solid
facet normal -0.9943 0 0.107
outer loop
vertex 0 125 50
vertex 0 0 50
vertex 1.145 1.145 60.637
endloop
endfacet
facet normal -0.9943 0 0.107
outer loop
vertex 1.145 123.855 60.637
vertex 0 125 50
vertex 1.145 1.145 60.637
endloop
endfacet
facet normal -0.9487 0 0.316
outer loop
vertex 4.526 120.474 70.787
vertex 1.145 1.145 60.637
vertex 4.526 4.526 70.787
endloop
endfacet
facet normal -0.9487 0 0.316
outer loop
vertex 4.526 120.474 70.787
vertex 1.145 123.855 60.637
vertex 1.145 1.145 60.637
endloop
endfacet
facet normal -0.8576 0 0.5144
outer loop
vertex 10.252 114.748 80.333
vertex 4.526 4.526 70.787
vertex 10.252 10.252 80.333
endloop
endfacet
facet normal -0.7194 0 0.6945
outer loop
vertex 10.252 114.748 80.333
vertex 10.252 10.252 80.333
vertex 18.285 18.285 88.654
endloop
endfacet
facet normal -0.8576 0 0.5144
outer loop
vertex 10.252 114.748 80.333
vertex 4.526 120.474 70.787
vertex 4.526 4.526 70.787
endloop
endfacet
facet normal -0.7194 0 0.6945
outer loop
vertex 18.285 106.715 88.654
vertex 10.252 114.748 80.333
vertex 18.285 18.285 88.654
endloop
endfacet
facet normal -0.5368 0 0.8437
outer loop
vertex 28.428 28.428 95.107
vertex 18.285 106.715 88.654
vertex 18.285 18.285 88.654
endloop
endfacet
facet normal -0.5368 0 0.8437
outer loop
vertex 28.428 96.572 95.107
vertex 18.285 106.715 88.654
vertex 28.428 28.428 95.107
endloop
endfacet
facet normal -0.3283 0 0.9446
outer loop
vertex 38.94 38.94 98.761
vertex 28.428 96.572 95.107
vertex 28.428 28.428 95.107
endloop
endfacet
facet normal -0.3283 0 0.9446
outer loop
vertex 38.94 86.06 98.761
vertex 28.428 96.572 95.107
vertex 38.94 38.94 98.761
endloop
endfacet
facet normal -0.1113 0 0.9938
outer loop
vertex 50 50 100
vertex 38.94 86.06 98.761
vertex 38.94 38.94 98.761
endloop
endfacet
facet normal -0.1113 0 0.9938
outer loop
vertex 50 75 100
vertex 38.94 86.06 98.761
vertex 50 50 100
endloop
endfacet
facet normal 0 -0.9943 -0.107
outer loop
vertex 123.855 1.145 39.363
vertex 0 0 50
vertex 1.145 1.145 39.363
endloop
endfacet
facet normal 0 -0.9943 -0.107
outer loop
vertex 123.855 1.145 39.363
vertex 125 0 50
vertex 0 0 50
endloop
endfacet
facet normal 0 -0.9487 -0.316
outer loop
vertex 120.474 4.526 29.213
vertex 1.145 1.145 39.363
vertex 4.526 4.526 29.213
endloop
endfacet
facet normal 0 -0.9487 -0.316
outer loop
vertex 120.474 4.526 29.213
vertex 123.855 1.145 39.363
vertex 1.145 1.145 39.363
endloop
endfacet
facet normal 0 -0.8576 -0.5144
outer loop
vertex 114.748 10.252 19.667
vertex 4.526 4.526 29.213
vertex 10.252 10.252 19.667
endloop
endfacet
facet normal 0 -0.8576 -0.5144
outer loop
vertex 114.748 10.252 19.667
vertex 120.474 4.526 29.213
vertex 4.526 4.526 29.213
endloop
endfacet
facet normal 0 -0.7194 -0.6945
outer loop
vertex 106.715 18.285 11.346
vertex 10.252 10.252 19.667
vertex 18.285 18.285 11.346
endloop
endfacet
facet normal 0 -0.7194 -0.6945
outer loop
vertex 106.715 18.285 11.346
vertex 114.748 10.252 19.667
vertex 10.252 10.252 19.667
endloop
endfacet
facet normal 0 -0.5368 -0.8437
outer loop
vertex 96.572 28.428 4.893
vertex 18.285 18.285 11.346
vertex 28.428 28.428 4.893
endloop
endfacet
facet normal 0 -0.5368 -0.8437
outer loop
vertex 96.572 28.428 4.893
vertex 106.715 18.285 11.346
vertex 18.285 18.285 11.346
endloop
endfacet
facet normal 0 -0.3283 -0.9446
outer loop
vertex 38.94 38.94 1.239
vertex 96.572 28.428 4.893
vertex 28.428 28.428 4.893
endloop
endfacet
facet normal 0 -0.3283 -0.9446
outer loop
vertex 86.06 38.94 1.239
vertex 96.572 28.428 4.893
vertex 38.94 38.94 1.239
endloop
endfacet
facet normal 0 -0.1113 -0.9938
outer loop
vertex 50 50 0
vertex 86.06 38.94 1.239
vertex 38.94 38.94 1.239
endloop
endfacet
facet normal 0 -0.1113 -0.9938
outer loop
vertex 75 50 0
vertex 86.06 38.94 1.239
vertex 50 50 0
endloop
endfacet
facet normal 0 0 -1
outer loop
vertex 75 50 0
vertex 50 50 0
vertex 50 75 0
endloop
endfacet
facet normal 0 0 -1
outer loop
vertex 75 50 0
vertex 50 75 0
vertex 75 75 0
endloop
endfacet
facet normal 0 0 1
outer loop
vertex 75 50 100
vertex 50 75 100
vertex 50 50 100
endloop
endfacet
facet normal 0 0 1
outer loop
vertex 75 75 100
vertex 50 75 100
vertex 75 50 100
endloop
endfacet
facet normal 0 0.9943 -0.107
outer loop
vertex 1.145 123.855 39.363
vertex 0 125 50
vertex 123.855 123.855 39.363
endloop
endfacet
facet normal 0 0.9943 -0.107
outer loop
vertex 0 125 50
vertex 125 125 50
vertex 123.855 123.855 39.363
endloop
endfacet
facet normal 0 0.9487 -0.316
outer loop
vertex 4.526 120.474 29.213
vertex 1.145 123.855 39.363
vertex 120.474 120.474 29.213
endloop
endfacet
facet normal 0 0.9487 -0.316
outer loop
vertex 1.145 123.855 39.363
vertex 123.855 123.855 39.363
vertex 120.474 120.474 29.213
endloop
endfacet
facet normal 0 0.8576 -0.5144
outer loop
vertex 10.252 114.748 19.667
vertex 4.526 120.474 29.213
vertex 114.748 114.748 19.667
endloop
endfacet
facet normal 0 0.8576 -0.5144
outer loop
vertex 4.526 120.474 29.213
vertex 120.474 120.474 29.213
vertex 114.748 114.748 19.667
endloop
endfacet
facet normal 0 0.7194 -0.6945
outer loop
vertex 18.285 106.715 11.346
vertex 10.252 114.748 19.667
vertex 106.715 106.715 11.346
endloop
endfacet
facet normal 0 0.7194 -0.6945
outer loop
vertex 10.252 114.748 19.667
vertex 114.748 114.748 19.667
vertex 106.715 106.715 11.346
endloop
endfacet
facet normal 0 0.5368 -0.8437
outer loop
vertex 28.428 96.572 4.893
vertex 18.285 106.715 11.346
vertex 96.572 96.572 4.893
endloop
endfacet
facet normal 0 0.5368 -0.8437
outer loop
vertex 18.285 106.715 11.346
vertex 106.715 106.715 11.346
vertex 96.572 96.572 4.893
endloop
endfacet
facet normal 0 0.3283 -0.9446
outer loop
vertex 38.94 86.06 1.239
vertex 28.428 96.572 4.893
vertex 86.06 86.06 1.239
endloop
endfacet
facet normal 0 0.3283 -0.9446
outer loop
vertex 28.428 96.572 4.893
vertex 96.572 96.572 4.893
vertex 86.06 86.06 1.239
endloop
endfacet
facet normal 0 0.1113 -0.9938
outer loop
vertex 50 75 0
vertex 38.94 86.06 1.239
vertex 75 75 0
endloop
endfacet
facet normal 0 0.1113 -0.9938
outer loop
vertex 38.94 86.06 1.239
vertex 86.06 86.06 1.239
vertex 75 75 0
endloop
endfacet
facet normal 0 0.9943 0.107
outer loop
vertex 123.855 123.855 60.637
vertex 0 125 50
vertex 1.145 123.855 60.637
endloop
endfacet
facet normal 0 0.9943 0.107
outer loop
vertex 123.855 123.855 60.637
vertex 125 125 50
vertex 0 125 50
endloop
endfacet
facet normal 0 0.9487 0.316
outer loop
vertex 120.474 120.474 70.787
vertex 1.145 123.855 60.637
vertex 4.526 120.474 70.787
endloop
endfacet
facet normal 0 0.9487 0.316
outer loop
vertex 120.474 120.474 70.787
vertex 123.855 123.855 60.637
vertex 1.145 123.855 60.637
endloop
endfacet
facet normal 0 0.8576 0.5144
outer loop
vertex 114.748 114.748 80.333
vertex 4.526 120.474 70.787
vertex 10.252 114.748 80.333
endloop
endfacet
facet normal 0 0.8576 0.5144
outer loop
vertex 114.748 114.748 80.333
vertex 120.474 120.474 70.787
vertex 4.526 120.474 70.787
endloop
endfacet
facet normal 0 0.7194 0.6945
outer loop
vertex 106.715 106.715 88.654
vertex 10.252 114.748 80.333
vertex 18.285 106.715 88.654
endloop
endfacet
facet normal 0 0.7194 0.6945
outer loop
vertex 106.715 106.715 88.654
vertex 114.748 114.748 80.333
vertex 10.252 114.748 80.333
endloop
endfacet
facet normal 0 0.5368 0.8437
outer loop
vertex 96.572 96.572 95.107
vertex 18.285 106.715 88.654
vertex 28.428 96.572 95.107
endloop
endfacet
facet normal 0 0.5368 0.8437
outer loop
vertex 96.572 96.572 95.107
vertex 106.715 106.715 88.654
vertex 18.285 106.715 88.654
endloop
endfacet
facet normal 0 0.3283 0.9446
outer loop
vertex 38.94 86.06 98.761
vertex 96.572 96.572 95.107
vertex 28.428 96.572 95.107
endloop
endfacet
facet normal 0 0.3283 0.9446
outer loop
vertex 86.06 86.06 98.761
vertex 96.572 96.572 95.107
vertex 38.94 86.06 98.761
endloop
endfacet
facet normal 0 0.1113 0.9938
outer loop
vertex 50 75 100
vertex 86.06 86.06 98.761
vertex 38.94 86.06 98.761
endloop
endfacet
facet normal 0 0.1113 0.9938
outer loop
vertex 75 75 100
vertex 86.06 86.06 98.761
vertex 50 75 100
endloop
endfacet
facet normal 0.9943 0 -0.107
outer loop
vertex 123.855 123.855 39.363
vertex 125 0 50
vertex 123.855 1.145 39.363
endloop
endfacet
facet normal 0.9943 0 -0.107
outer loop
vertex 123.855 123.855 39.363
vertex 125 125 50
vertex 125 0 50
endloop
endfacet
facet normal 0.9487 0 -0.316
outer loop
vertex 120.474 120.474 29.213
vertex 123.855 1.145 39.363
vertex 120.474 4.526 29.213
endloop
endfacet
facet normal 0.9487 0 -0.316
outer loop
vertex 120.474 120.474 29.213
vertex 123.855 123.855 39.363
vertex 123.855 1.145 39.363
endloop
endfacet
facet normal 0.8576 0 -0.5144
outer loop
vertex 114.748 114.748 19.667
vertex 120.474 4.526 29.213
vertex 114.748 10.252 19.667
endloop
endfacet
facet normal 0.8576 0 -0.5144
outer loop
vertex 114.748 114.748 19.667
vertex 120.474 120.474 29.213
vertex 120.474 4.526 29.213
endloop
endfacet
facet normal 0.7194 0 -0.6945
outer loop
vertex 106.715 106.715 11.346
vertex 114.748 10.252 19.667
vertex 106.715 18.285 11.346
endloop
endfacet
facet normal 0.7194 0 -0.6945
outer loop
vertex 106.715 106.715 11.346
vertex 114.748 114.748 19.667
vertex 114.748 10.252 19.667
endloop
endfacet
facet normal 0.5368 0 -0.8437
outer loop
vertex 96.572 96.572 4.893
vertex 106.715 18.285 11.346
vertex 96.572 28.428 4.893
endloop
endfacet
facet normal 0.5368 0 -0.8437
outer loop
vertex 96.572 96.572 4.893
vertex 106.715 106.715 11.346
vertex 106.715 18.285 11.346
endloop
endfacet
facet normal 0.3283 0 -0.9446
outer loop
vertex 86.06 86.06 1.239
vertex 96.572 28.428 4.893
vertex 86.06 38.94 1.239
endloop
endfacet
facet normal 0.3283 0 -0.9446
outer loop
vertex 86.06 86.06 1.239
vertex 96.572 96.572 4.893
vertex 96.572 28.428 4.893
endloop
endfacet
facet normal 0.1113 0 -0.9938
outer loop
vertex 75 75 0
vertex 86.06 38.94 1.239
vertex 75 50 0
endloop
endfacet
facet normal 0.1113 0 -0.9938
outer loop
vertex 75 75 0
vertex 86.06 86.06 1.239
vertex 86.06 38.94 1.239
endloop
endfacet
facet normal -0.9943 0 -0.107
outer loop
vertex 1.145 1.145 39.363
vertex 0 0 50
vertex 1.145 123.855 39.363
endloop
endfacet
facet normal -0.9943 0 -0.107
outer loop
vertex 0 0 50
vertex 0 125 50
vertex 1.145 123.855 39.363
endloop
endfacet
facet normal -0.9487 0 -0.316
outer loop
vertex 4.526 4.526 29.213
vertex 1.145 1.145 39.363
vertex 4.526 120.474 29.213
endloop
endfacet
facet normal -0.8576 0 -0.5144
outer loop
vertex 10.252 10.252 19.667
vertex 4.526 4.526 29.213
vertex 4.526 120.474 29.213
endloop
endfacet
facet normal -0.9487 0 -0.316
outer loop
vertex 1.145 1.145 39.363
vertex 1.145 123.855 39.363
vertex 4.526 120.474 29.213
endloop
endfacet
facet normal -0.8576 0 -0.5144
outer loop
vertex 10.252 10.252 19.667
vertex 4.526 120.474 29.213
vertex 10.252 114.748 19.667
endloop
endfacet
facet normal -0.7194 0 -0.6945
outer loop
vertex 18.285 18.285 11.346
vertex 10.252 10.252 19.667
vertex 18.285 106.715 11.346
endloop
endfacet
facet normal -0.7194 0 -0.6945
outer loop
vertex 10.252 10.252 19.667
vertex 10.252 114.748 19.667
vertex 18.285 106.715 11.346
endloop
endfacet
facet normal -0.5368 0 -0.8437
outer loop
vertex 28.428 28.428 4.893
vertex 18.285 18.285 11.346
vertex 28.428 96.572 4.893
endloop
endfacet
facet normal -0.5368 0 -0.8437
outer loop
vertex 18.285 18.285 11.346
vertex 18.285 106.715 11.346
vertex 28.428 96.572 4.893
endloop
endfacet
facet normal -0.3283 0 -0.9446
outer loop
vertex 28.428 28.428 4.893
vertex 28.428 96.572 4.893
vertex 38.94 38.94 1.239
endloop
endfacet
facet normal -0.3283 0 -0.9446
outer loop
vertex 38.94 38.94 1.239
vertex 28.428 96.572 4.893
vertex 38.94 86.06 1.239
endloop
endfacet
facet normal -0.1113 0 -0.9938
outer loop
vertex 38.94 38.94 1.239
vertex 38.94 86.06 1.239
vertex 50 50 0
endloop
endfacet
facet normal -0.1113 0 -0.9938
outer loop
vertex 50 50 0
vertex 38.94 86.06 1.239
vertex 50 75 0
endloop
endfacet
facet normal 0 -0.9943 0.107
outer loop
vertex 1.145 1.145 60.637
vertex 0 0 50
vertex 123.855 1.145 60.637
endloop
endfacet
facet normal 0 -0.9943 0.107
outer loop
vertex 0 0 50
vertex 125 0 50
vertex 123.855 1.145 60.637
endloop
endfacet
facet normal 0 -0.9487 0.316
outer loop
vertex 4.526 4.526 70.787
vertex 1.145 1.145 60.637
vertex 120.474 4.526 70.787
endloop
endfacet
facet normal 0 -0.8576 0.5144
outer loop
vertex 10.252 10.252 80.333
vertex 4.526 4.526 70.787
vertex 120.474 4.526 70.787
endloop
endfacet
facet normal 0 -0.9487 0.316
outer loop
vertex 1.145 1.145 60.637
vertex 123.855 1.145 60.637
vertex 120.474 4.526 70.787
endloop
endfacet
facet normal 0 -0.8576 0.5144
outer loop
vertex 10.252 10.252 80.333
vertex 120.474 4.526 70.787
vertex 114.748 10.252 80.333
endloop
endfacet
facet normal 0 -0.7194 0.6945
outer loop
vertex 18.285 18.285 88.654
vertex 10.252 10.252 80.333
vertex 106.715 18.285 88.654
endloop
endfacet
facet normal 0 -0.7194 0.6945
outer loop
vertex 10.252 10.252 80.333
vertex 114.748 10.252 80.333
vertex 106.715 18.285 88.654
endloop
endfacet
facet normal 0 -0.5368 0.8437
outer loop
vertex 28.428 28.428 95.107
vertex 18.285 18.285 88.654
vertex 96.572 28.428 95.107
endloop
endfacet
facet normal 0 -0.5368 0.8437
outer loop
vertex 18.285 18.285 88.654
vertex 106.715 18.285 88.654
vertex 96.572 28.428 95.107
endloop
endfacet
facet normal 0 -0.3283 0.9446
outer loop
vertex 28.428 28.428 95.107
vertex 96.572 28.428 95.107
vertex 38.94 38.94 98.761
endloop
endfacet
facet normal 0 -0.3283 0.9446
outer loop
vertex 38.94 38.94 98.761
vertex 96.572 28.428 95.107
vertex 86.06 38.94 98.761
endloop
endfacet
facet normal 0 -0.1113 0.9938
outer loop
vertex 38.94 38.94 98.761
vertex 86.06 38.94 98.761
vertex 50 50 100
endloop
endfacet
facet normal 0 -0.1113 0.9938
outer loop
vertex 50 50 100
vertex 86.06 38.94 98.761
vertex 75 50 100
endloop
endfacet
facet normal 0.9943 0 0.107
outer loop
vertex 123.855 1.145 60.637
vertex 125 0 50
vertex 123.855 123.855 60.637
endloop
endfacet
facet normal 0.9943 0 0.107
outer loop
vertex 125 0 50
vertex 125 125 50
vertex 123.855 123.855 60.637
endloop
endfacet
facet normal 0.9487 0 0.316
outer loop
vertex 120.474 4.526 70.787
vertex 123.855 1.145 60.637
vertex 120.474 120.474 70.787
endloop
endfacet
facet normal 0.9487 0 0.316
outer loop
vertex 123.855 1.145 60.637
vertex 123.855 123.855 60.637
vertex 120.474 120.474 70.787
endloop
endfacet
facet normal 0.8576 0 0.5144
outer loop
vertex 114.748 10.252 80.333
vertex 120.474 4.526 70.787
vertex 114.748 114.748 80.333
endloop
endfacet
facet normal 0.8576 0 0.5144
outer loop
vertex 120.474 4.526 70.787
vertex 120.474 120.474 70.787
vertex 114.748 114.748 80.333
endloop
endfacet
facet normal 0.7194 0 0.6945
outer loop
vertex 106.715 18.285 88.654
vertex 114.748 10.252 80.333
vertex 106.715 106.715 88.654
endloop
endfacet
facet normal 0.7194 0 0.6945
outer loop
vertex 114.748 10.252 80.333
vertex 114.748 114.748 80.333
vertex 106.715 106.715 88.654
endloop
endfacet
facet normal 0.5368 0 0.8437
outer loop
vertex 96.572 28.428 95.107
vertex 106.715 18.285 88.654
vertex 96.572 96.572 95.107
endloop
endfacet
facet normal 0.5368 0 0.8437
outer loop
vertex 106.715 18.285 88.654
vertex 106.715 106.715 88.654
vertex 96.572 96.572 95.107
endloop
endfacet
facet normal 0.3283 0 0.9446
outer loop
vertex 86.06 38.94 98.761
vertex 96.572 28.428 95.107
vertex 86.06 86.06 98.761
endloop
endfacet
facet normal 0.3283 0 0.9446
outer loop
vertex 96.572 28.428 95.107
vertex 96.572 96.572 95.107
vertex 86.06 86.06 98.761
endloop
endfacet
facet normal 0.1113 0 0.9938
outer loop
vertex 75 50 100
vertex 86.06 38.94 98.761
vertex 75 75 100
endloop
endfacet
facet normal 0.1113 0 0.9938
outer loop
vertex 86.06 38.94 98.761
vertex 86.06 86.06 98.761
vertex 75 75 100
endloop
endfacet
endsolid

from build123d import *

# Parameters (mm, degrees)
SKETCH1_W           = 125
SKETCH1_H           = 125
BOSS_EXTRUDE1_DEPTH = 100
FILLET1_R           = 50


with BuildPart() as part:
    # Sketch1 → Boss-Extrude1 (new body)
    with BuildSketch(Plane.XY):
        with Locations((62.5, 62.5)):
            Rectangle(SKETCH1_W, SKETCH1_H)
    extrude(amount=BOSS_EXTRUDE1_DEPTH)

    # Fillet1
    fillet1_edges = [part.edges().sort_by_distance(p)[0] for p in [
        (62.5, 0, 0),
        (125, 62.5, 0),
        (62.5, 125, 0),
        (0, 62.5, 0),
        (62.5, 125, 100),
        (125, 62.5, 100),
        (62.5, 0, 100),
        (0, 62.5, 100),
    ]]
    fillet(fillet1_edges, radius=FILLET1_R - 0.0001)  # a hair under: the kernel refuses the full size


solid = part.part
